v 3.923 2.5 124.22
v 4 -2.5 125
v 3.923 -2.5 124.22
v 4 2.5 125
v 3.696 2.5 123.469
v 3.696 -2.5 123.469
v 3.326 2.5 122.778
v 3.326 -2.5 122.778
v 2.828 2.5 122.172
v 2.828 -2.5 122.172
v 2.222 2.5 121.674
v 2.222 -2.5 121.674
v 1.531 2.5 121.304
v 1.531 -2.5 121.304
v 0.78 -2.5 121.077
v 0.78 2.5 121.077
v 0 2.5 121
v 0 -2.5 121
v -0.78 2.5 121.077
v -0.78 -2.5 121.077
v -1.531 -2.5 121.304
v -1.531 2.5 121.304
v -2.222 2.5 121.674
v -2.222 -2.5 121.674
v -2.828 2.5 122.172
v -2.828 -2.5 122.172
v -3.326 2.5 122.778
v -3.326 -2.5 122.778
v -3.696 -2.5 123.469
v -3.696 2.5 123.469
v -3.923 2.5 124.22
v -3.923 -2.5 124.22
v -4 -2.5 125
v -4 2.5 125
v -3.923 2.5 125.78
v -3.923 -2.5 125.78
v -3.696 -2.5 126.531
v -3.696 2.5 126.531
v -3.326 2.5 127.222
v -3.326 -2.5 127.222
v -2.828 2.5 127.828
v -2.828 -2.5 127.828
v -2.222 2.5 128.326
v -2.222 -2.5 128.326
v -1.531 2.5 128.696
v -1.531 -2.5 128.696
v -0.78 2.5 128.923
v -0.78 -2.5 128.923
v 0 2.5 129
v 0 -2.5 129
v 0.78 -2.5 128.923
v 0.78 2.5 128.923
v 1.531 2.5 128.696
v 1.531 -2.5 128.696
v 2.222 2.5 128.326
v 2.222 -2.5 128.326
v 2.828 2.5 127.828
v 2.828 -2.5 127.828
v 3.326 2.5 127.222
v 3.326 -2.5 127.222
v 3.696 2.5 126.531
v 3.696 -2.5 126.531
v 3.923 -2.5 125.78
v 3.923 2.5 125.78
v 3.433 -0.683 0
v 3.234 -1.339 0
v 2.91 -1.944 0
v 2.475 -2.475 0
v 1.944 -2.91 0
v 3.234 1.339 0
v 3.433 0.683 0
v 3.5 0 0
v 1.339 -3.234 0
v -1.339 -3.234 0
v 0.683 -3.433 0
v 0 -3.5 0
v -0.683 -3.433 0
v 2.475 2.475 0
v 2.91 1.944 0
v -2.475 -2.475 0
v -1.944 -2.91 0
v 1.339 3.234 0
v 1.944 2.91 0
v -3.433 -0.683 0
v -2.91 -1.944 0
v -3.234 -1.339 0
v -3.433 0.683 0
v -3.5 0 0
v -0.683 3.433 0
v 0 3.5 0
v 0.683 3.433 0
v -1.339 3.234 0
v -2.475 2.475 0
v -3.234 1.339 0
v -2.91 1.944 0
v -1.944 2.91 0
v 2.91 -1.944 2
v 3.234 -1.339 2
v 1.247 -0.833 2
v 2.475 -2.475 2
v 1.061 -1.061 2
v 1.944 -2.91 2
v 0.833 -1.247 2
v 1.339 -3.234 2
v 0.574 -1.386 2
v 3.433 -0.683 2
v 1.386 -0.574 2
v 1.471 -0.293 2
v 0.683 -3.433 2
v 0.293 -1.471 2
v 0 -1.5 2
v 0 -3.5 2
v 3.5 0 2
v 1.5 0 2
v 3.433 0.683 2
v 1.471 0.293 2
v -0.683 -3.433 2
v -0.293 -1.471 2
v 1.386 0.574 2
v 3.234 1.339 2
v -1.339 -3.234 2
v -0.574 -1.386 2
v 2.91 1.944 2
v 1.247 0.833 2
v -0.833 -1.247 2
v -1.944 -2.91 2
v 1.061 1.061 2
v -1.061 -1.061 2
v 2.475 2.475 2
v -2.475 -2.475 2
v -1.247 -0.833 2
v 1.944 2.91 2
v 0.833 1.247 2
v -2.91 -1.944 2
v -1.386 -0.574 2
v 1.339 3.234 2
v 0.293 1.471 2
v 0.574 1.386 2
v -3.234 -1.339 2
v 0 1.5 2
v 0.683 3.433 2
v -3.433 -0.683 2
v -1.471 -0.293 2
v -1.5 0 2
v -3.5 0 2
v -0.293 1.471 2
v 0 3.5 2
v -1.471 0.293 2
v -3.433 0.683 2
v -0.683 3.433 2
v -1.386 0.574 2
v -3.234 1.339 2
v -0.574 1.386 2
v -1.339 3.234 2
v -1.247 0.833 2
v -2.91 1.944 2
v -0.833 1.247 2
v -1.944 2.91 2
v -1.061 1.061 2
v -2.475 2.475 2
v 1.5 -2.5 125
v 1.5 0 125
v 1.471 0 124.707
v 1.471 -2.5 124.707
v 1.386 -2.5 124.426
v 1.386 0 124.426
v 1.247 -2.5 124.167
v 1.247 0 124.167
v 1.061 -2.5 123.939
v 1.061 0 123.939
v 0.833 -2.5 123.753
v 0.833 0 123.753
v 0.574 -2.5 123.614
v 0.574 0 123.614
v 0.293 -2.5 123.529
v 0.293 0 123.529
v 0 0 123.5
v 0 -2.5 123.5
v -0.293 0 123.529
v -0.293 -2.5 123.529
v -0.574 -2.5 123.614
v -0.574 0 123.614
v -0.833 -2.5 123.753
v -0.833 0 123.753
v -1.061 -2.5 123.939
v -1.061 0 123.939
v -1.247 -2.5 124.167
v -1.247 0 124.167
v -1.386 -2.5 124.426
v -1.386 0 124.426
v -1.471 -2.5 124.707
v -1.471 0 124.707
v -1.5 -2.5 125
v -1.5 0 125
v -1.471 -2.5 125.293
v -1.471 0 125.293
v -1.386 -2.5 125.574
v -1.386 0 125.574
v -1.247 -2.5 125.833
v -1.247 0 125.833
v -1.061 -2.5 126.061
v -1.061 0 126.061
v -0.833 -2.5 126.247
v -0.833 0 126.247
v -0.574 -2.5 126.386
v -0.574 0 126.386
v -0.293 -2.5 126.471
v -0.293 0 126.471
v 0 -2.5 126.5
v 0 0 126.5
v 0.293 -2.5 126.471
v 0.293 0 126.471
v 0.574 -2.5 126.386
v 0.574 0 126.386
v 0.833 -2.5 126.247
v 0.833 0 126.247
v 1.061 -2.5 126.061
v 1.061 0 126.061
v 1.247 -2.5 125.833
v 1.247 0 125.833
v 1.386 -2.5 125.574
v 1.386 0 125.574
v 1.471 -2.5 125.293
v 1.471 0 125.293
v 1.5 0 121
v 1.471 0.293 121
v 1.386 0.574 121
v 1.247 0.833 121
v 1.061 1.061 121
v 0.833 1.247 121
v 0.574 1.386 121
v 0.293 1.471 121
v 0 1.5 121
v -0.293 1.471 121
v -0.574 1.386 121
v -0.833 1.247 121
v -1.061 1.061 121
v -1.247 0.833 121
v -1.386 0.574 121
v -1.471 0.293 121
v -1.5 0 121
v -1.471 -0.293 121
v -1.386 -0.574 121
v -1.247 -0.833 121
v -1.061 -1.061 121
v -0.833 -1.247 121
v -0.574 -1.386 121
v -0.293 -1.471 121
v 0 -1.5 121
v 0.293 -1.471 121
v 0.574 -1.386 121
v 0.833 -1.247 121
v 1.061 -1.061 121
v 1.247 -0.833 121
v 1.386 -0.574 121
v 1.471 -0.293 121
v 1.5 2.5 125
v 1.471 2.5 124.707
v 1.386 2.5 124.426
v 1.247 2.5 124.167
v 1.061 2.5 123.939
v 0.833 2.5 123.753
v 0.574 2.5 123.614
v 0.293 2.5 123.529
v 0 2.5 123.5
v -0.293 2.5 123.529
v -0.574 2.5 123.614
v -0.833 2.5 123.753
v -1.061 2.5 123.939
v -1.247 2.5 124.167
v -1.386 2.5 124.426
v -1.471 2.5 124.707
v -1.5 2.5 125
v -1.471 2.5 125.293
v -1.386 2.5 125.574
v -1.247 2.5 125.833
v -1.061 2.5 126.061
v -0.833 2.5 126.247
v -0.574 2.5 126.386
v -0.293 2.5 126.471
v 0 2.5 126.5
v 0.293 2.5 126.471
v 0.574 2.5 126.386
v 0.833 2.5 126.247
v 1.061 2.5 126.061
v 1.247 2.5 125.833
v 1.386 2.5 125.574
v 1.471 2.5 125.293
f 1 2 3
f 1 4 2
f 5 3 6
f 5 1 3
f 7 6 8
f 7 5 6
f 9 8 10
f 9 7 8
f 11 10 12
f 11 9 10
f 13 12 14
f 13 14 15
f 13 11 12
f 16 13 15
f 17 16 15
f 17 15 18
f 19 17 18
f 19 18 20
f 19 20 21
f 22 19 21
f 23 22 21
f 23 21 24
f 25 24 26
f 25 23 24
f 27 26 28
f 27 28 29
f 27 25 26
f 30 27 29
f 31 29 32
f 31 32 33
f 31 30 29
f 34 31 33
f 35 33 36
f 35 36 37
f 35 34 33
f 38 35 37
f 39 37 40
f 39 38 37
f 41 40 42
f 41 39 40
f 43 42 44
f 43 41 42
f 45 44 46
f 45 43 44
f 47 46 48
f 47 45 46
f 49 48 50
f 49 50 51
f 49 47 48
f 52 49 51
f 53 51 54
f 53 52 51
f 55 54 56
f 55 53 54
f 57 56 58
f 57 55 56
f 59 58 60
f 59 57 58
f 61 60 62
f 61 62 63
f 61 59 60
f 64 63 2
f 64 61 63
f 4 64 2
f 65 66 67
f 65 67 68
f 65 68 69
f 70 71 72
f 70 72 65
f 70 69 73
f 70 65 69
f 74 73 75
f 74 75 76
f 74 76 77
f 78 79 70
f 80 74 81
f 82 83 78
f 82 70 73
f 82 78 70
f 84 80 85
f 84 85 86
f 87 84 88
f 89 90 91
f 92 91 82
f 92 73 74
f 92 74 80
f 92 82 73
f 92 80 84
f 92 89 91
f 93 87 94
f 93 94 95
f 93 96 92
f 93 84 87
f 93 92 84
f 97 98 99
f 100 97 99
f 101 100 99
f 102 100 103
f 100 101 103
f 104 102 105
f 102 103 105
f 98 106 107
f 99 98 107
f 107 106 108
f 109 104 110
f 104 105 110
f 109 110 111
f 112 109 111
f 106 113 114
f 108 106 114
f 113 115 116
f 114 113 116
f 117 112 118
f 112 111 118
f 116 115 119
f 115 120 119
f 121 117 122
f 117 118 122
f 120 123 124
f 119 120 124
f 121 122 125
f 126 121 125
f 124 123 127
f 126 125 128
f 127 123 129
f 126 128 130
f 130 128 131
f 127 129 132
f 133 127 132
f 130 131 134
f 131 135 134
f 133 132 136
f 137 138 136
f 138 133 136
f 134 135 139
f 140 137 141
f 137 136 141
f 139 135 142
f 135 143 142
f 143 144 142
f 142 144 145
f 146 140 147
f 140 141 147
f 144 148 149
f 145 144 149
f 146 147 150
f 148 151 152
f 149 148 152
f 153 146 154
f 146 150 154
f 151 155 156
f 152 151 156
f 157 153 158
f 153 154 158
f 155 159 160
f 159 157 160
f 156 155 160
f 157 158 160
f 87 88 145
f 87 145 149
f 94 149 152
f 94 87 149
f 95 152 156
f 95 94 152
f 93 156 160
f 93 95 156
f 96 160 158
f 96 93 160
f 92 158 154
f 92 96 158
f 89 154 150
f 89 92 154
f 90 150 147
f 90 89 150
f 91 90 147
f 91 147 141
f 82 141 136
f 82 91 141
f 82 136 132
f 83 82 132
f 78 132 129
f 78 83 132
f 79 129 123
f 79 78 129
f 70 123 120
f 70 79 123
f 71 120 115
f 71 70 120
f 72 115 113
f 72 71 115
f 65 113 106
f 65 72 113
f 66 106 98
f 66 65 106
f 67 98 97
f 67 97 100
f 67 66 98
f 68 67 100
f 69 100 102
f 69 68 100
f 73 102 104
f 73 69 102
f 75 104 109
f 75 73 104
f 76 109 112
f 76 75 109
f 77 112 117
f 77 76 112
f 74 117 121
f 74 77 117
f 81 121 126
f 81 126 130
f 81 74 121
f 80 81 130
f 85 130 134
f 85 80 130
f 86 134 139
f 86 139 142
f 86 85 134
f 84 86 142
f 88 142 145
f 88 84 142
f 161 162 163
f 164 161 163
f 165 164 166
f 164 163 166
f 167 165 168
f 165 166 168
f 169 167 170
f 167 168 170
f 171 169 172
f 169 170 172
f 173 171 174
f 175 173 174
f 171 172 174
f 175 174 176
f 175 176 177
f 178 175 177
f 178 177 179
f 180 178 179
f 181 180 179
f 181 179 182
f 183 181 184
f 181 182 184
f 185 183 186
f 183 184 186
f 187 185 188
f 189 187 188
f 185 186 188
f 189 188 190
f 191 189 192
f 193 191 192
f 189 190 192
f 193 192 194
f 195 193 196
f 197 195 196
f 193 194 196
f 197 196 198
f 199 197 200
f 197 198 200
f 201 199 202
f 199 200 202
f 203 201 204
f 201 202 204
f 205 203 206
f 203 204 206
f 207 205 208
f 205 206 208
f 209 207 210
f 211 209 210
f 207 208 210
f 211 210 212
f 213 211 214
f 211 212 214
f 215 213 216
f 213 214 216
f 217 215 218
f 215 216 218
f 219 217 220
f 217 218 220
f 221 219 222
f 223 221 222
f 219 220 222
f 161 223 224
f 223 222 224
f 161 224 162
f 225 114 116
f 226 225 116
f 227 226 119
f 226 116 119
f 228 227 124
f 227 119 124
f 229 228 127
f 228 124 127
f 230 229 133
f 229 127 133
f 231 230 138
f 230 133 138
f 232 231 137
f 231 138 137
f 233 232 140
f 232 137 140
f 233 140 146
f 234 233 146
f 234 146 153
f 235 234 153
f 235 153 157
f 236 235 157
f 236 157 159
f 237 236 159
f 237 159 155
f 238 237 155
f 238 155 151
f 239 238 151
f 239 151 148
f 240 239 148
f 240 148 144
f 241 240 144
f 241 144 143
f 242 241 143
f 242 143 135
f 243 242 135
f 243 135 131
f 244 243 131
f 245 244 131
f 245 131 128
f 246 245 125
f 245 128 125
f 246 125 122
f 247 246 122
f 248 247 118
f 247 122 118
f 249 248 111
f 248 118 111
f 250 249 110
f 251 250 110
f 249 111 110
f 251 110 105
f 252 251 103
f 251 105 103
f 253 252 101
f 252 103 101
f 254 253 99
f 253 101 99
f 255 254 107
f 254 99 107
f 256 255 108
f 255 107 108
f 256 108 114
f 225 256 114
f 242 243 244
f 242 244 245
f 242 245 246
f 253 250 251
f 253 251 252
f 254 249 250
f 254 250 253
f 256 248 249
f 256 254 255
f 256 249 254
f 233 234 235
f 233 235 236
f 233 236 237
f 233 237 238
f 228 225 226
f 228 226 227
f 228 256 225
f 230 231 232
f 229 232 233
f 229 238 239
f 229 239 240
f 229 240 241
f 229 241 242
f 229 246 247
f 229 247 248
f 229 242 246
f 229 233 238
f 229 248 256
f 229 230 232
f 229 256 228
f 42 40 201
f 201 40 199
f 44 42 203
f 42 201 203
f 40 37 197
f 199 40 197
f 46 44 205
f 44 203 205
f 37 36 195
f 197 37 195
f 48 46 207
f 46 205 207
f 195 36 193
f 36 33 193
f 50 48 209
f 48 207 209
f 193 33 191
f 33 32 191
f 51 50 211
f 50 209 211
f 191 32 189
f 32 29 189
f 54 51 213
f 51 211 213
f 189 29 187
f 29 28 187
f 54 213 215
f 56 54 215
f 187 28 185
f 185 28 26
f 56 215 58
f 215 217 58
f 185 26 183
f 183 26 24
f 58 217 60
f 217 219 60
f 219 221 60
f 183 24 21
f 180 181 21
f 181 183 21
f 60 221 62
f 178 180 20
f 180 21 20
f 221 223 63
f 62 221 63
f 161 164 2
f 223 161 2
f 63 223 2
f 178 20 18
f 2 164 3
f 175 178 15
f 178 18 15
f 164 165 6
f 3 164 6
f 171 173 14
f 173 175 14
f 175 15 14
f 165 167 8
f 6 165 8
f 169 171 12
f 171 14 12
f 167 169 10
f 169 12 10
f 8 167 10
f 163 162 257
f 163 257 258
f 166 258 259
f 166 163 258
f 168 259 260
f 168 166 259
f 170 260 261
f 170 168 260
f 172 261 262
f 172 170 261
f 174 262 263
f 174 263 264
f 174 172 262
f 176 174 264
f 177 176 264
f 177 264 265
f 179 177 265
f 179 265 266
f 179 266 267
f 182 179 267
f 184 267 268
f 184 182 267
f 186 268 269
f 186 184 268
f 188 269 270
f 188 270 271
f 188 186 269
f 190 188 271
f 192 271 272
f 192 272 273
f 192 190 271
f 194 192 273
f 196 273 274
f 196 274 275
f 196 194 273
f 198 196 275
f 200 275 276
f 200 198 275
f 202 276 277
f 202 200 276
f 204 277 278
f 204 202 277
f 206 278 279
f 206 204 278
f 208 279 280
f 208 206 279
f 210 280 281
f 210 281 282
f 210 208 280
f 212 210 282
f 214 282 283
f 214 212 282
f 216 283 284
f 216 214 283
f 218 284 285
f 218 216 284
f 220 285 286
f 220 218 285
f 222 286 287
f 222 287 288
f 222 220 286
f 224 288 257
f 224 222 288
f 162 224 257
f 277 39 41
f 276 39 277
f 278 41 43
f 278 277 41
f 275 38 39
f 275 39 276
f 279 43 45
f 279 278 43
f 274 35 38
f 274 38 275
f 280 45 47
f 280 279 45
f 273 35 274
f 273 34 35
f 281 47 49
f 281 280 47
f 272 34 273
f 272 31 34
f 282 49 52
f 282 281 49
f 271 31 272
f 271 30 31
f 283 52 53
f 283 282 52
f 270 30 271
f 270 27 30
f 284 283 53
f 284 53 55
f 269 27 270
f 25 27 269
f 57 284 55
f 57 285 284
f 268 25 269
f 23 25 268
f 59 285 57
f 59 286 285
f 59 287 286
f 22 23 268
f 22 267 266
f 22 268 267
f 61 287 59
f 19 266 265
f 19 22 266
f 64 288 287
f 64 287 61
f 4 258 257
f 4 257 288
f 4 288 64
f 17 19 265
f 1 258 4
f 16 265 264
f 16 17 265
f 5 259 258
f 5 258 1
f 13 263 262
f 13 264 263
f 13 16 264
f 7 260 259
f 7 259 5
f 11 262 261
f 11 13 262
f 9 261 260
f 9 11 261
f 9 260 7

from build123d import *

# Parameters (mm, degrees)
SKETCH1_R                = 1.5
BOSS_EXTRUDE1_DEPTH      = 121
BOSS_EXTRUDE2_DEPTH      = 2.5
BOSS_EXTRUDE2_DEPTH_BACK = 2.5
SKETCH2_R                = 4
SKETCH2_R_2              = 1.5
SKETCH3_R                = 3.5
BOSS_EXTRUDE3_DEPTH      = 2


with BuildPart() as part:
    # Sketch1 → Boss-Extrude1 (new body)
    with BuildSketch(Plane.XY):
        Circle(SKETCH1_R)
    extrude(amount=BOSS_EXTRUDE1_DEPTH)

    # Sketch3 → Boss-Extrude3 (add)
    with BuildSketch(Plane(origin=(0, 0, 0), x_dir=(-1, 0, 0), z_dir=(0, 0, -1))):
        Circle(SKETCH3_R)
    extrude(amount=-BOSS_EXTRUDE3_DEPTH)


with BuildPart() as body_2:
    # Sketch2 → Boss-Extrude2 (new, two sides: drawn at the far end of the back side and taken through both)
    with BuildSketch(Plane(origin=(0, 0, 0), x_dir=(1, 0, 0), z_dir=(0, 1, 0)).offset(-BOSS_EXTRUDE2_DEPTH_BACK)):
        with Locations((0, -125)):
            Circle(SKETCH2_R)
        with Locations((0, -125)):
            Circle(SKETCH2_R_2, mode=Mode.SUBTRACT)
    extrude(amount=BOSS_EXTRUDE2_DEPTH + BOSS_EXTRUDE2_DEPTH_BACK)


solid = Compound([part.part, body_2.part])
